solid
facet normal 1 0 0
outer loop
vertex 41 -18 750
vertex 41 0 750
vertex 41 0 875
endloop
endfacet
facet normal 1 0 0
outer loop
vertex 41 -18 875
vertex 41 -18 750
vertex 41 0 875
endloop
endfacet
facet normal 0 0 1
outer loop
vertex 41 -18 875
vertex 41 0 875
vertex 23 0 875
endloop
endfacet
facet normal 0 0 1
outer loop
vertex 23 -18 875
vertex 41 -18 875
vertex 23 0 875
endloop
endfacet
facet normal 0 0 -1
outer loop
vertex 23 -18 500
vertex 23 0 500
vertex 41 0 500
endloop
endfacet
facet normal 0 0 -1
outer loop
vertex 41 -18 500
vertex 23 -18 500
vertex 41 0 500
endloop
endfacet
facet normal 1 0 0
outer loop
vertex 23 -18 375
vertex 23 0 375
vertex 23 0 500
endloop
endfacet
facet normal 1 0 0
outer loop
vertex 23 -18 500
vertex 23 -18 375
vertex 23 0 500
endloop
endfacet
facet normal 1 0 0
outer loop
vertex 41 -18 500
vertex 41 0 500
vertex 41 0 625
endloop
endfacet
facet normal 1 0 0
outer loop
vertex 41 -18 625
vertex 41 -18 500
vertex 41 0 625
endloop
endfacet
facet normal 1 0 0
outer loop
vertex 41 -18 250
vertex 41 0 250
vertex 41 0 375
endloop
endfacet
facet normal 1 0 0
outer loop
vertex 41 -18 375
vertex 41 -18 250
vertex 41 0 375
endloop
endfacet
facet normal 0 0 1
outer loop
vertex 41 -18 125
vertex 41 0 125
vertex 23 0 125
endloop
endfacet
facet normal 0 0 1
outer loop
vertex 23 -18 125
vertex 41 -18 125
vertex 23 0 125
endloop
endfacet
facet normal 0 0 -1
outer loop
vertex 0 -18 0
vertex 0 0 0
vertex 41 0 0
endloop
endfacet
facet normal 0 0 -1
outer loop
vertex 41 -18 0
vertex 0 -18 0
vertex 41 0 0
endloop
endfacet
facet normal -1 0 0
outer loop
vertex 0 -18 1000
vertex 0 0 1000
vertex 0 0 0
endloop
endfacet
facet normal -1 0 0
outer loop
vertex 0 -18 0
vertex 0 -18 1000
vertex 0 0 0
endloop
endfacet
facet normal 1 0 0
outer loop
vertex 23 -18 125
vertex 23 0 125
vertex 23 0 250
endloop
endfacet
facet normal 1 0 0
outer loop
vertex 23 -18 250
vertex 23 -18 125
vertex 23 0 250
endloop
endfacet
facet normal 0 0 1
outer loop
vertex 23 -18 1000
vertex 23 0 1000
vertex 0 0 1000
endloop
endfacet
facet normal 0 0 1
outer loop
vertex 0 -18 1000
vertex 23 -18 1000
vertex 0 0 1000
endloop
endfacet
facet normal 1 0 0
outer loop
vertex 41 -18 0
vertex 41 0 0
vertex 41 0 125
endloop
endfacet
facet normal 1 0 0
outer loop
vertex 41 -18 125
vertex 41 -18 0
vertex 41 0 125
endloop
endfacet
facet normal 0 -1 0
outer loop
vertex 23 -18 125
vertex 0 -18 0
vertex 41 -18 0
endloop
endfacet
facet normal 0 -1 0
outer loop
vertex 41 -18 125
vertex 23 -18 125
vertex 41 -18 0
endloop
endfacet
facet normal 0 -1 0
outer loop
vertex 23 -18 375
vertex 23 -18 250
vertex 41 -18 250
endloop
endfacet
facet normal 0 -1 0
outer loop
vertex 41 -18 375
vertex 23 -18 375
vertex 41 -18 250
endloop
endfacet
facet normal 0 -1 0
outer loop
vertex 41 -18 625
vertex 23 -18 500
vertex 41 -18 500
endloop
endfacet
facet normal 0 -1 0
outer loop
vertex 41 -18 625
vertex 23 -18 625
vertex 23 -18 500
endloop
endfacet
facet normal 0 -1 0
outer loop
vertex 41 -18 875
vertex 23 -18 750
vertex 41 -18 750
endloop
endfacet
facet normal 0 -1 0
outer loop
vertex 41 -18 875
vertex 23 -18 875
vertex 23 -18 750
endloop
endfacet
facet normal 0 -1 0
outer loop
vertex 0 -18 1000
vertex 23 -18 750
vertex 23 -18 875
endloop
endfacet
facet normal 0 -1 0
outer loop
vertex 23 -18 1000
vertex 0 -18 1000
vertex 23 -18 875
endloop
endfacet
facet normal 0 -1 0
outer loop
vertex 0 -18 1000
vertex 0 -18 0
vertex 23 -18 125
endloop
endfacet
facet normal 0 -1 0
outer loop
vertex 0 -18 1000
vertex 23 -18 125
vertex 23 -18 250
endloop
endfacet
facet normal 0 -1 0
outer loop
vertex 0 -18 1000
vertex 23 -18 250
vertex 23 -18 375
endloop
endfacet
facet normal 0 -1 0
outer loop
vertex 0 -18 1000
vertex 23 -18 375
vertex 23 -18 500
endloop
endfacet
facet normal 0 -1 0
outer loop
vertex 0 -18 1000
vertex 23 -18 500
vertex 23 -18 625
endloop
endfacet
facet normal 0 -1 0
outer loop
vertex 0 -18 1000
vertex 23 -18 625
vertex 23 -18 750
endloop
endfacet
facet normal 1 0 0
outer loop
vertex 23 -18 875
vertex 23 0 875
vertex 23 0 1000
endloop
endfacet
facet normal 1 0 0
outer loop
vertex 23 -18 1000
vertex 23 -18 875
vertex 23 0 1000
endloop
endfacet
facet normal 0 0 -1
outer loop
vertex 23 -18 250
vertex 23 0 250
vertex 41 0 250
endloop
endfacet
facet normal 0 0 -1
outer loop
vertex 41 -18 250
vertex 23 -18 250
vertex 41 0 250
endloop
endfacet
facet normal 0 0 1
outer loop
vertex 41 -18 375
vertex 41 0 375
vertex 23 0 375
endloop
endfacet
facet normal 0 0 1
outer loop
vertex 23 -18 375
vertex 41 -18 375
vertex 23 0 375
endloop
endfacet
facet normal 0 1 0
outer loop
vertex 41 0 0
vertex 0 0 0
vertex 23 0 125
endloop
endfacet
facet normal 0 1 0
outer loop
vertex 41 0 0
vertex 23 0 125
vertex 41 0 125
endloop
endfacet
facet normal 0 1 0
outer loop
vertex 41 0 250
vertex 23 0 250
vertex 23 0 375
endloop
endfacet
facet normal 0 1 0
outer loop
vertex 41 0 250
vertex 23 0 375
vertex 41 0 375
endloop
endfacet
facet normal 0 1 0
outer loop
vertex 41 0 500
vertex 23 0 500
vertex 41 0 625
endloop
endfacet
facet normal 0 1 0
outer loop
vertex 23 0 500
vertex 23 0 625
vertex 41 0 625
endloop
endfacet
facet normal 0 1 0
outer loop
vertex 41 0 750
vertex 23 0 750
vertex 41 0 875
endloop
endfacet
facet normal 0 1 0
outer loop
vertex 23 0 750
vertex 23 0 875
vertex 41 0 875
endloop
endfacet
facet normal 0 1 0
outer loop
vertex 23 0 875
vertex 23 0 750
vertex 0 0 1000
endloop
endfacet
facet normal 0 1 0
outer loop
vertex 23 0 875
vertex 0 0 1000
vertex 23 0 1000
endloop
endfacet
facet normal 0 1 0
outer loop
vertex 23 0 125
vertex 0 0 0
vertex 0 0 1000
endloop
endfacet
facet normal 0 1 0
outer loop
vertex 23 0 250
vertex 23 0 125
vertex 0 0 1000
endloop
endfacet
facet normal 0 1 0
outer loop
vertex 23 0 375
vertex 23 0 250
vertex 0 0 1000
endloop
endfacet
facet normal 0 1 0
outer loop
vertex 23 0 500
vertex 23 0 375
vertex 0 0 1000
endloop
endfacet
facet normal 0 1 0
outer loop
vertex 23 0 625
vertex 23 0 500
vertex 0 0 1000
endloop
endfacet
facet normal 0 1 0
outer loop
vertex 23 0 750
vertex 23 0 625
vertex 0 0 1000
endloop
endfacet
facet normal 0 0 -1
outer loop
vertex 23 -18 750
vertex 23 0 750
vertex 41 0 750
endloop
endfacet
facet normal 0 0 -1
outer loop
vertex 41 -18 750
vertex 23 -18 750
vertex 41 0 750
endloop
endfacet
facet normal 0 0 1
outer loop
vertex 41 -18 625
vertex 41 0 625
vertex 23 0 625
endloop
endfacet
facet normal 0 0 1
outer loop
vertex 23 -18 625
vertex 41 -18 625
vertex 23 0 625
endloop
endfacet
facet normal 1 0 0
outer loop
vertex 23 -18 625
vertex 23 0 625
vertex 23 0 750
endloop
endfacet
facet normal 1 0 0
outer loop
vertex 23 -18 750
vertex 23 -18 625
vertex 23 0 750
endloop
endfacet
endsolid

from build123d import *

# Parameters (mm, degrees)
F1_DEPTH = 18


# Not quite as in the source:
# - a feature names something its author has since deleted; it is built from what else it names


with BuildPart() as f1:
    # F0 (on Front) → F1 (new body)
    with BuildSketch(Plane.XZ):
        Polygon((0, 1000), (0, 0), (41, 0), (41, 125), (23, 125), (23, 250), (41, 250), (41, 375), (23, 375), (23, 500), (41, 500), (41, 625), (23, 625), (23, 750), (41, 750), (41, 875), (23, 875), (23, 1000), align=None)
    extrude(amount=F1_DEPTH)


solid = f1.part
